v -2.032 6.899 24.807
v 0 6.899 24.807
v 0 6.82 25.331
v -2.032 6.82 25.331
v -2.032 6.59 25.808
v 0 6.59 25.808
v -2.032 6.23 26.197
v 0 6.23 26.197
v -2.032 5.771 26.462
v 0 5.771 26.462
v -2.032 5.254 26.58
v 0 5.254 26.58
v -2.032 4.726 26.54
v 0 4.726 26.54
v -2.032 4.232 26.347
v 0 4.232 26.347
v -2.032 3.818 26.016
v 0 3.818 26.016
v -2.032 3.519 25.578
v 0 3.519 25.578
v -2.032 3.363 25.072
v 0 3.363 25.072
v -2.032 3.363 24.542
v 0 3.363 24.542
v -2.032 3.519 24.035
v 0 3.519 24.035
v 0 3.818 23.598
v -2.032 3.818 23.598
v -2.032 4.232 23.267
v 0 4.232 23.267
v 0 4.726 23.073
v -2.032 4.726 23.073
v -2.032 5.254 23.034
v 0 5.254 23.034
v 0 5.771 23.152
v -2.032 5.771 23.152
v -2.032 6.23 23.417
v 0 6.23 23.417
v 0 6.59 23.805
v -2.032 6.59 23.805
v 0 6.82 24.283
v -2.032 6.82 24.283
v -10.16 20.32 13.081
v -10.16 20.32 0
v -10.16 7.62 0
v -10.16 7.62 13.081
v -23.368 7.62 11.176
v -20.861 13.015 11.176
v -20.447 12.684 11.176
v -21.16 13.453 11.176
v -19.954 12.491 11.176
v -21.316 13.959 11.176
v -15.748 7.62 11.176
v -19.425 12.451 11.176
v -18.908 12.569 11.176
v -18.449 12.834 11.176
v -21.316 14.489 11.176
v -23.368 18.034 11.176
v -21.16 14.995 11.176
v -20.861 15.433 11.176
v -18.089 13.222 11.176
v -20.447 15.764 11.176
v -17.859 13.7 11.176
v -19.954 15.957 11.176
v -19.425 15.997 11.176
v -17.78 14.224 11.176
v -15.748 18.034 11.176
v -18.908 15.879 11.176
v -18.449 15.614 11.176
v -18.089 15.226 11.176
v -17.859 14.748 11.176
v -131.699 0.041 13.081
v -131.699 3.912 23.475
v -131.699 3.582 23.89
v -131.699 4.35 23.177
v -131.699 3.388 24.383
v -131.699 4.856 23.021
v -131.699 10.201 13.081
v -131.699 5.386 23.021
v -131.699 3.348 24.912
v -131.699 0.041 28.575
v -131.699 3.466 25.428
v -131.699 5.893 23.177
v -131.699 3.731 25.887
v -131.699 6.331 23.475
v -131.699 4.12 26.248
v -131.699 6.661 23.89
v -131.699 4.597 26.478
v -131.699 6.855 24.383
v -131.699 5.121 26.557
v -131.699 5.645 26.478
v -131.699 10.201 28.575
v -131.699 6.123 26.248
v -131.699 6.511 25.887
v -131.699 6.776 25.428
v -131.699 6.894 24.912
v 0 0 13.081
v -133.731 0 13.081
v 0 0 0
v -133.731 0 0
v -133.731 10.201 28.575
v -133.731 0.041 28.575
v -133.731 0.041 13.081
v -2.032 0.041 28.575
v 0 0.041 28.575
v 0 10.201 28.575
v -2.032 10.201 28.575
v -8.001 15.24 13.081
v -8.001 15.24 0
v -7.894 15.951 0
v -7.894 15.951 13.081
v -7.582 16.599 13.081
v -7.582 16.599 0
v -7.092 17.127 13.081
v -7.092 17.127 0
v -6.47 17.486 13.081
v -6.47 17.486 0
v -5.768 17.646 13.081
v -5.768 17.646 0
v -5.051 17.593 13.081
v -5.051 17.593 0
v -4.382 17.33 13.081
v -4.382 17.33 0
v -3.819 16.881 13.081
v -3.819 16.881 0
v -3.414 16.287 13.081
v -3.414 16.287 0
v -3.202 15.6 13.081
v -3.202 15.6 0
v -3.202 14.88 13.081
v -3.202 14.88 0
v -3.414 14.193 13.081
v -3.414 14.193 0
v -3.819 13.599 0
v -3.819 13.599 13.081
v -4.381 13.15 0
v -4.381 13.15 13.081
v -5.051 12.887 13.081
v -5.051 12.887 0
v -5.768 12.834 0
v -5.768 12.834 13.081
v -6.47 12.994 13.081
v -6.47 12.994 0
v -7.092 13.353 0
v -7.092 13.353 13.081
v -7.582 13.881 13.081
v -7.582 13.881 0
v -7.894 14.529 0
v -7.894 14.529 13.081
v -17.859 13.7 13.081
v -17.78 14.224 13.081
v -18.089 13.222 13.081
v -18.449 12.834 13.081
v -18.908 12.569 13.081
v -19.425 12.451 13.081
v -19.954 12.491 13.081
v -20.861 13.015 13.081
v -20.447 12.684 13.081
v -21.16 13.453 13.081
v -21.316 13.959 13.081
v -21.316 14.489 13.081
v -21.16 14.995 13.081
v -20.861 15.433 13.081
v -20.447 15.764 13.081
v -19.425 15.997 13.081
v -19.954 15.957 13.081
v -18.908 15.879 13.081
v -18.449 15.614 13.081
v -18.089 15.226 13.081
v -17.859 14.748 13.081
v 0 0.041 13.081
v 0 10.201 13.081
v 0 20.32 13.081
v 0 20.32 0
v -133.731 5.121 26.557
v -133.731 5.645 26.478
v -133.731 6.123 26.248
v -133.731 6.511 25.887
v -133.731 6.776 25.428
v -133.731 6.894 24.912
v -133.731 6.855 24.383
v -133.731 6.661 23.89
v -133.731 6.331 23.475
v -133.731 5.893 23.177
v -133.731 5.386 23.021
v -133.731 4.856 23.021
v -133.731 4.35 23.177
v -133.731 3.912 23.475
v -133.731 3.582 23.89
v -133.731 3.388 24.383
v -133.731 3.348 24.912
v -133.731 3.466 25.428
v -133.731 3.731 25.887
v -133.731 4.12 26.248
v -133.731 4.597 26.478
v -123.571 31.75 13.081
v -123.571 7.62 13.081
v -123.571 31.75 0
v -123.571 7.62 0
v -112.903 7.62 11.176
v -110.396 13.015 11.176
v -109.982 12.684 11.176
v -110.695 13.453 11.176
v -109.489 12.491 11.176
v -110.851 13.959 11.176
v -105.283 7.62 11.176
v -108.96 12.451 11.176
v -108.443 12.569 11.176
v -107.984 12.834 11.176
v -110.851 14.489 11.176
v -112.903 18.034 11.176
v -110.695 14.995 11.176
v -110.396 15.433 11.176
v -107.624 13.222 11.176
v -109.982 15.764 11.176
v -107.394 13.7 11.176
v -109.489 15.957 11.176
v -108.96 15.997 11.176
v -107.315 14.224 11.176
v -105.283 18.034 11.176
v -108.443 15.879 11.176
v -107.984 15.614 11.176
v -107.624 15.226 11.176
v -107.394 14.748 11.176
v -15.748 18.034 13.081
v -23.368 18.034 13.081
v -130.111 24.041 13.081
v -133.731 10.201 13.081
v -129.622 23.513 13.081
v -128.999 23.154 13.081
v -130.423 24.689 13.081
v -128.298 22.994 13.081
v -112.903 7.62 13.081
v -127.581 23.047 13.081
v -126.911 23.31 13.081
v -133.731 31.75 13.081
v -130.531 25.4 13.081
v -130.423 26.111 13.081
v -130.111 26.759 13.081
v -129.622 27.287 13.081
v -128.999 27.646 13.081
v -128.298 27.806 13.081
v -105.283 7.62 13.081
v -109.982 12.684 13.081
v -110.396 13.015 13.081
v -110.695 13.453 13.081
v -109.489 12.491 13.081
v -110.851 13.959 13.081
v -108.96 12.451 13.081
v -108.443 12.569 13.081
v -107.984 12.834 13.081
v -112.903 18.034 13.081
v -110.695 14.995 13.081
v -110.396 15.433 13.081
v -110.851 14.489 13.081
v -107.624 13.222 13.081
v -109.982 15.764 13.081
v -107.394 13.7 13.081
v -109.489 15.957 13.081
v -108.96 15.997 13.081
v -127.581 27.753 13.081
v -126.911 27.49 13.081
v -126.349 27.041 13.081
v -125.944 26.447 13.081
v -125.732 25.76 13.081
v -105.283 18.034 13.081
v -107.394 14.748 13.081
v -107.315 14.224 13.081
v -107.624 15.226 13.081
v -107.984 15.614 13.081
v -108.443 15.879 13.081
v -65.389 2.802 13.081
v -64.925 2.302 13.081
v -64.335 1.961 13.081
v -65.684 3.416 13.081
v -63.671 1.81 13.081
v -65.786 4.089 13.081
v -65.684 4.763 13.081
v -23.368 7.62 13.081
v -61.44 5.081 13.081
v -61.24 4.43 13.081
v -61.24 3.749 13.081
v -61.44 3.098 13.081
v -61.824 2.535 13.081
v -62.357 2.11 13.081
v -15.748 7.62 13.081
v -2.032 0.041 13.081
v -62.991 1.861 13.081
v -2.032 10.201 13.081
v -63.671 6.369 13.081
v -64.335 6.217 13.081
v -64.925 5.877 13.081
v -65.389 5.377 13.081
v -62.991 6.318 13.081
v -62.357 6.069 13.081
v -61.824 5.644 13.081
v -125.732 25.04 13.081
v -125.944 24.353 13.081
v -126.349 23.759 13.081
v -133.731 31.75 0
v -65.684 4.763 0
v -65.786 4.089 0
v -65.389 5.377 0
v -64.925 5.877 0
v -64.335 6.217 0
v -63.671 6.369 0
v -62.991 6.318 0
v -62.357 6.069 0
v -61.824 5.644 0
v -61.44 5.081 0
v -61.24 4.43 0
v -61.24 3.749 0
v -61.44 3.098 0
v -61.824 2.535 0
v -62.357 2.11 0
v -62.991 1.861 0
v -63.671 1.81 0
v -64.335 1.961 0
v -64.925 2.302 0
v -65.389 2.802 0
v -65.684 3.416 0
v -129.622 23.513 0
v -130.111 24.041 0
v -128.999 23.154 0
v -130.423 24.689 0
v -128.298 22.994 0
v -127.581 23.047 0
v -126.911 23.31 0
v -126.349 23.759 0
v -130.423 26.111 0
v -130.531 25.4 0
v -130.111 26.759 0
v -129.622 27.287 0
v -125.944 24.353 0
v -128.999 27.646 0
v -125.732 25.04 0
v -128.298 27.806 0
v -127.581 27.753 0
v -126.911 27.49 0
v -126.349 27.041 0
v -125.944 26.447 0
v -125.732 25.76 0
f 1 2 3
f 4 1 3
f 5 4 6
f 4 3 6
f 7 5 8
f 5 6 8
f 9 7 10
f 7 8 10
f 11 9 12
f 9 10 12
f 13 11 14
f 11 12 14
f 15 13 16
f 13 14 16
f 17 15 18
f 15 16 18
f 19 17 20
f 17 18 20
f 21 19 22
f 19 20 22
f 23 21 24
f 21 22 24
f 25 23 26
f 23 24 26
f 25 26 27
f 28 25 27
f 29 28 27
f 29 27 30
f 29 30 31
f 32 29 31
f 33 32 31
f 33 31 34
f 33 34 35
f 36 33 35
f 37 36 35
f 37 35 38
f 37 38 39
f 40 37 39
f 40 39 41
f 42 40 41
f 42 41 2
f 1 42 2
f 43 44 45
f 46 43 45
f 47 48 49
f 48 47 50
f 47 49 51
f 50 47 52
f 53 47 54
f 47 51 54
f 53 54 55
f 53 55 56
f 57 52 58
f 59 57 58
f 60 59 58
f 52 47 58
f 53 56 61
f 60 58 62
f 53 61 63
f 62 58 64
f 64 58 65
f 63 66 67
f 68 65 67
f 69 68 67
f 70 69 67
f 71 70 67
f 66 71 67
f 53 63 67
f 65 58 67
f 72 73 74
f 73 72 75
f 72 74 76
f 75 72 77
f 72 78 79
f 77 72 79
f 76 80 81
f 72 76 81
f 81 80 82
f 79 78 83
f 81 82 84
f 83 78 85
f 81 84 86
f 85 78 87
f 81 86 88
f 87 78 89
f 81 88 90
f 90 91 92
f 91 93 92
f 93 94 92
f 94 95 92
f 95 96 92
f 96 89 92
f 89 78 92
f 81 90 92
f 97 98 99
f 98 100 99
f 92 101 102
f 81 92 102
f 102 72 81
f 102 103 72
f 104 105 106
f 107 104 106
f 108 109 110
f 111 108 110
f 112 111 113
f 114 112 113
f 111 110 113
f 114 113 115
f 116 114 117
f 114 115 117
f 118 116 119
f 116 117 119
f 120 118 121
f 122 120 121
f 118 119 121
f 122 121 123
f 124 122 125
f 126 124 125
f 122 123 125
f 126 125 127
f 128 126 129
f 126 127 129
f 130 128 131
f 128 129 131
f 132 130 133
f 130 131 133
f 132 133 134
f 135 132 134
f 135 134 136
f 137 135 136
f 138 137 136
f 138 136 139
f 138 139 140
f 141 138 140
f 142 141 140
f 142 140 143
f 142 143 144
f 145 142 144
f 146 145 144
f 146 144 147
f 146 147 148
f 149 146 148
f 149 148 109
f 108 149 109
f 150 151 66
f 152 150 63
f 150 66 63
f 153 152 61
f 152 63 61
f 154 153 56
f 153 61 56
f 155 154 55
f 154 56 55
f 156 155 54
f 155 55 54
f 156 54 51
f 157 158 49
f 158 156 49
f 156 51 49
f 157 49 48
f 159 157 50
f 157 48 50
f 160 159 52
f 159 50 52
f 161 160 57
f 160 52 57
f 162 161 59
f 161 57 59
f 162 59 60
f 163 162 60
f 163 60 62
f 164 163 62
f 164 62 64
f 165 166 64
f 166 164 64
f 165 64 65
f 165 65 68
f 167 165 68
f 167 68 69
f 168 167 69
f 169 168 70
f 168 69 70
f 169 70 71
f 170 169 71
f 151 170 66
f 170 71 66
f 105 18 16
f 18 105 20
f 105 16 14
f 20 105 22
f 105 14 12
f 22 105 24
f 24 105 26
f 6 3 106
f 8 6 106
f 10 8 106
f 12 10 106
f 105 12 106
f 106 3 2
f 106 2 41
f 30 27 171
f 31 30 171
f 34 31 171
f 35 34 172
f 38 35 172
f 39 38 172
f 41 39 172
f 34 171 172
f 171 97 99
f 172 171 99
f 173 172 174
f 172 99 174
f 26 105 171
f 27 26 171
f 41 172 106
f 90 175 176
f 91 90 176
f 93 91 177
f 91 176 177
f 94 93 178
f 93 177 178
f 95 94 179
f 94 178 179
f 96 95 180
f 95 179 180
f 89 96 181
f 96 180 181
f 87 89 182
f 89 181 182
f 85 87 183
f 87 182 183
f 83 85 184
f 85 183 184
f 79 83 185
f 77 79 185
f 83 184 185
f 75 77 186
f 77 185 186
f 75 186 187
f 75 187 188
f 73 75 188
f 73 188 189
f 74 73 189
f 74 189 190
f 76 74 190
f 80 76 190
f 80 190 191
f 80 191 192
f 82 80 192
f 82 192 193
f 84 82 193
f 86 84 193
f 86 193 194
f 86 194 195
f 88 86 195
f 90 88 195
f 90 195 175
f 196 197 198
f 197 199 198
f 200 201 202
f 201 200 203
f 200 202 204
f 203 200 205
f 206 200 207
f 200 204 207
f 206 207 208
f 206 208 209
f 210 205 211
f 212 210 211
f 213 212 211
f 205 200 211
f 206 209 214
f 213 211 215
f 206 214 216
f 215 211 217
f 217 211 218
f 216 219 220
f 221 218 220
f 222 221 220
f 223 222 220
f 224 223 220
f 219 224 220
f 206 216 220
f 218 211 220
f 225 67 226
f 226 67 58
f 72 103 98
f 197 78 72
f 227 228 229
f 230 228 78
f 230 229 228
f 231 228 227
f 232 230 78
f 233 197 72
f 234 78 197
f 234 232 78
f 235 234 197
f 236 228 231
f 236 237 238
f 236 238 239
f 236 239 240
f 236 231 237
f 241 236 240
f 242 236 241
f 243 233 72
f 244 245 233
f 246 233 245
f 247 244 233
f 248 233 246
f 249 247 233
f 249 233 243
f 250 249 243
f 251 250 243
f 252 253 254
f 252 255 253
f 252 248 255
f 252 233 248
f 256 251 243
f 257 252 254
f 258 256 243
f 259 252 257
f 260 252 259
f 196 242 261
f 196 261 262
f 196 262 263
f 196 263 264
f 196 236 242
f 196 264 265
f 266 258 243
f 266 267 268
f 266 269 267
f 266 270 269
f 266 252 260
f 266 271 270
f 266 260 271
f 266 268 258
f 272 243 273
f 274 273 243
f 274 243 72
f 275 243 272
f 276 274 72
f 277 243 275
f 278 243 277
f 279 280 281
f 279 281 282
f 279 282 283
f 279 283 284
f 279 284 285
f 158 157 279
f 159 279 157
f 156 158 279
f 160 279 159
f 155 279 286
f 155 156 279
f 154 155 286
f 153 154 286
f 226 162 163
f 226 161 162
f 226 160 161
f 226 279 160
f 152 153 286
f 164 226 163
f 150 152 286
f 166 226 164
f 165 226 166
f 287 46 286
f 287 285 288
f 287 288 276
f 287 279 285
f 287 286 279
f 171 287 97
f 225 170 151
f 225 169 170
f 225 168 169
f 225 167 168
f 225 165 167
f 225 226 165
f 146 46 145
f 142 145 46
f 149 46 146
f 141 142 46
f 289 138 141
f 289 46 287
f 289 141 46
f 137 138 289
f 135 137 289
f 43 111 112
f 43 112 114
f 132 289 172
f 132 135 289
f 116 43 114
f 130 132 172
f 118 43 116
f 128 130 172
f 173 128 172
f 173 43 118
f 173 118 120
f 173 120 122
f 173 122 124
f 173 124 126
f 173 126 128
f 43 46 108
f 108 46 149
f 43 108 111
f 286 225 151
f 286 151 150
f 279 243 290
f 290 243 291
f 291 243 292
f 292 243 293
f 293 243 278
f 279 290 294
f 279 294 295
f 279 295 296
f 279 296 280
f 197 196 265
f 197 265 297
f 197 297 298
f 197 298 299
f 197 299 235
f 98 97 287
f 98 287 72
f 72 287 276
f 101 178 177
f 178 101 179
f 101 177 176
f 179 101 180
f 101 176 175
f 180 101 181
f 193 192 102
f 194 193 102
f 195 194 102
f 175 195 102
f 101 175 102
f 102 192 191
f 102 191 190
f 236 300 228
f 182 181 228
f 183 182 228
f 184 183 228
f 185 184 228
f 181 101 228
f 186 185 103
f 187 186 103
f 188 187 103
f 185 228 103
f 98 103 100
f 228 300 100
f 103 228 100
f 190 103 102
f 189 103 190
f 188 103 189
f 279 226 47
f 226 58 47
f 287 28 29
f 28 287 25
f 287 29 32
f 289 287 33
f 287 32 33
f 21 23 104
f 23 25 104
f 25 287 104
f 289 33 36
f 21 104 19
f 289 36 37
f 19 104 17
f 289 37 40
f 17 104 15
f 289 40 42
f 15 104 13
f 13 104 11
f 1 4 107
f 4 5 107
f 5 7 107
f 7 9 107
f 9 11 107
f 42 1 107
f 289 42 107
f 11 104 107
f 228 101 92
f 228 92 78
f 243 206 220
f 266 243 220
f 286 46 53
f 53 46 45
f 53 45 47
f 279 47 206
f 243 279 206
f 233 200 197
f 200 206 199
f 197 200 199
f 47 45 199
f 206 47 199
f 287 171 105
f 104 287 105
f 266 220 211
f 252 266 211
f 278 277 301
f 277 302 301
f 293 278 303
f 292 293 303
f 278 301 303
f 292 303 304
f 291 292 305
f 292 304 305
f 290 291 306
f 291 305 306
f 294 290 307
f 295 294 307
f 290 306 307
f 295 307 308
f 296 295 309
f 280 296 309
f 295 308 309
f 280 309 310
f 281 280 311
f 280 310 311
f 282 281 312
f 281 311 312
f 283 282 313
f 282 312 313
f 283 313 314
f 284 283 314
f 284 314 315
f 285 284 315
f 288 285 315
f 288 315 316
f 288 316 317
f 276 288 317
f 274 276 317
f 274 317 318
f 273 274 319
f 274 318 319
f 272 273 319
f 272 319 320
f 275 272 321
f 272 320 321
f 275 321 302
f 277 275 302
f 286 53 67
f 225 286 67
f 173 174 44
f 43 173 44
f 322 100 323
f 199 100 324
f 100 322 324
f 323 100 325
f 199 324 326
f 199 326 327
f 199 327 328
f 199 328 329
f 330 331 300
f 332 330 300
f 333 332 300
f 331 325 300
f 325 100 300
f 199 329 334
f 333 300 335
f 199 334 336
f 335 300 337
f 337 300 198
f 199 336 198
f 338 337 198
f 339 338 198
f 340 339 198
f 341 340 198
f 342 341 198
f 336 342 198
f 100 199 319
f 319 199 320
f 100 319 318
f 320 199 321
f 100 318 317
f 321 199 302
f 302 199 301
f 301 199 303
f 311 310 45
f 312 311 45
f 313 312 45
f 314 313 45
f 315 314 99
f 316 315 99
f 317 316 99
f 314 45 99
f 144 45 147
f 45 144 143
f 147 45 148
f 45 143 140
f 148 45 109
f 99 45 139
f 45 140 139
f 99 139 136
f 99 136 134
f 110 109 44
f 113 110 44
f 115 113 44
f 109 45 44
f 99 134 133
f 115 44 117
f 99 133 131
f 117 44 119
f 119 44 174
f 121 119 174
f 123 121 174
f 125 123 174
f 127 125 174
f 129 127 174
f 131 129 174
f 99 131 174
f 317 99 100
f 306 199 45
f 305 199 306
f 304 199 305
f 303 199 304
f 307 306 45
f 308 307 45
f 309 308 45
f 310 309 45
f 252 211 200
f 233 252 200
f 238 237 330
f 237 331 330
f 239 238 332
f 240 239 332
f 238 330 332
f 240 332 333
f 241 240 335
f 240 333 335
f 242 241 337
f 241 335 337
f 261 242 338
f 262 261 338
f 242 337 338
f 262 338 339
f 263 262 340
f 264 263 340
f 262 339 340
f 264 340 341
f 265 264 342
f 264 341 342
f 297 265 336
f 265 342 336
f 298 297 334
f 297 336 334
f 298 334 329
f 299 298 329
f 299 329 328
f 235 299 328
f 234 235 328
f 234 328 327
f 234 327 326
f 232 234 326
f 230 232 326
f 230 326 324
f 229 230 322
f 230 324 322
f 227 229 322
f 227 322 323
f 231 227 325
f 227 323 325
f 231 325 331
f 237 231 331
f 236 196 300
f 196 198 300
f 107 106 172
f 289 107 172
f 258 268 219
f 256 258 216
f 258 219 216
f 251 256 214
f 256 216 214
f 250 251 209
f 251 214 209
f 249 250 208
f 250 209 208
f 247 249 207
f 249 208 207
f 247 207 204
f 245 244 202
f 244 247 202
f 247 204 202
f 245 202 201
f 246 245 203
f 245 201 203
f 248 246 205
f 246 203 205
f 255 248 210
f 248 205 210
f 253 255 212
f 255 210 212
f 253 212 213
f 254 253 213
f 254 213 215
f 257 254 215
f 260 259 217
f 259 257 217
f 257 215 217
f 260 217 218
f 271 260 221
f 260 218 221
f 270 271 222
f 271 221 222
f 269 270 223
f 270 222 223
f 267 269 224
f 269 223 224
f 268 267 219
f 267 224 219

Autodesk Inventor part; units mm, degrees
ref_plane "YZ Plane" through (0, 0, 0) normal (1, 0, 0) x (0, 1, 0)
ref_plane "XZ Plane" through (0, 0, 0) normal (0, 1, 0) x (-1, 0, 0)
ref_plane "XY Plane" through (0, 0, 0) normal (0, 0, 1) x (1, 0, 0)
sketch "Sketch1" plane through (0, 0, 0) normal (0, 0, 1) x (1, 0, 0)
  line L0 (-10.16, 7.62) -> (-15.748, 7.62)
  line L1 (-15.748, 7.62) -> (-15.748, 18.034)
  line L2 (-15.748, 18.034) -> (-23.368, 18.034)
  line L3 (-23.368, 18.034) -> (-23.368, 7.62)
  line L4 (-23.368, 7.62) -> (-105.283, 7.62)
  line L5 (-105.283, 7.62) -> (-105.283, 18.034)
  line L6 (-105.283, 18.034) -> (-112.903, 18.034)
  line L7 (-112.903, 18.034) -> (-112.903, 7.62)
  line L8 (-112.903, 7.62) -> (-123.571, 7.62)
  line L9 (-123.571, 7.62) -> (-123.571, 31.75)
  line L10 (-123.571, 31.75) -> (-133.731, 31.75)
  circle A0 centre (-109.093, 14.224) radius 1.778
  line L11 (-133.731, 31.75) -> (-133.731, 0)
  line L12 (-133.731, 0) -> (0, 0)
  circle A1 centre (-19.558, 14.224) radius 1.778
  line L13 (0, 0) -> (0, 20.32)
  line L14 (0, 20.32) -> (-10.16, 20.32)
  line L15 (-10.16, 20.32) -> (-10.16, 7.62)
  circle A2 centre (-128.143, 25.4) radius 2.413
  circle A3 centre (-63.5, 4.064) radius 2.413
  circle A4 centre (-5.6324, 15.2344) radius 2.413
  dimension "d22" = 20.32
  dimension "d39" = 4.826
  dimension "d40" = 4.826
  dimension "d41" = 4.826
extrude "Extrusion2" add sketch "Sketch1" along normal blind 13.081 contours L15 L14 L13 L12 L11 L10 L9 L8 L7 L6 L5 L4 L3 L2 L1 L0 | A2 | A3 | A4
sketch "Sketch2" plane through (0, 0, 0) normal (0, 0, 1) x (1, 0, 0)
  line L0 (-10.16, 7.62) -> (-15.748, 7.62) projected
  line L1 (-12.954, 7.62) -> (-118.4109, 7.62)
  line L2 (-118.4109, 7.62) -> (-118.4109, 21.3127)
  line L3 (-118.4109, 21.3127) -> (-12.954, 21.3127)
  line L4 (-12.954, 21.3127) -> (-12.954, 7.62)
  point P0 (0, 0)
extrude "Extrusion3" cut sketch "Sketch2" along normal blind 11.176
sketch "Sketch3" plane through (0, 0, 0) normal (1, 0, 0) x (0, 1, 0)
  line L0 (31.75, 13.081) -> (0, 13.081) projected
  line L1 (0.0413, 13.081) -> (0.0413, 28.575)
  line L2 (0.0413, 13.081) -> (15.5353, 13.081) construction
  line L3 (0.0413, 28.575) -> (10.2013, 28.575)
  line L4 (10.2013, 28.575) -> (10.2013, 13.081)
  circle A0 centre (5.1213, 24.8069) radius 1.778
  point P0 (0, 0)
  dimension "d28" = 15.494
  dimension "d29" = 90
  dimension "d30" = 10.16
  dimension "d31" = 3.556
extrude "Extrusion4" add sketch "Sketch3" against normal blind 2.032
ref_plane "Work Plane1" through (-133.731, 0, 0) normal (-1, 0, 0) x (0, 0, 1)
sketch "Sketch5" plane through (-133.731, 0, 0) normal (-1, 0, 0) x (0, 0, 1)
  line L0 (28.575, 10.2013) -> (13.081, 10.2013) projected
  line L1 (13.081, 0.0413) -> (28.575, 0.0413) projected
  line L2 (13.081, 10.2013) -> (28.575, 10.2013)
  line L3 (28.575, 10.2013) -> (28.575, 0.0413)
  line L4 (28.575, 0.0413) -> (13.081, 0.0413)
  line L5 (13.081, 0.0413) -> (13.081, 10.2013)
  circle A0 centre (24.7788, 5.1213) radius 1.778
  point P0 (0, 0)
  dimension "d36" = 3.556
extrude "Extrusion5" add sketch "Sketch5" against normal blind 2.032
ref_plane "Work Plane2" through (0, 0, 0) normal (0, 0, -1) x (-1, 0, 0)
sketch "Sketch6" plane through (0, 0, 0) normal (0, 0, -1) x (-1, 0, 0)
  circle A0 centre (5.588, 15.24) radius 2.413
  circle A1 centre (63.5, 4.0894) radius 2.286
  circle A2 centre (128.1176, 25.4) radius 2.413
  point P0 (0, 0)
  dimension "d43" = 4.826
  dimension "d44" = 4.572
  dimension "d45" = 4.826
extrude "Extrusion6" cut sketch "Sketch6" against normal blind 15.24
properties part number "PC_top_piece"
